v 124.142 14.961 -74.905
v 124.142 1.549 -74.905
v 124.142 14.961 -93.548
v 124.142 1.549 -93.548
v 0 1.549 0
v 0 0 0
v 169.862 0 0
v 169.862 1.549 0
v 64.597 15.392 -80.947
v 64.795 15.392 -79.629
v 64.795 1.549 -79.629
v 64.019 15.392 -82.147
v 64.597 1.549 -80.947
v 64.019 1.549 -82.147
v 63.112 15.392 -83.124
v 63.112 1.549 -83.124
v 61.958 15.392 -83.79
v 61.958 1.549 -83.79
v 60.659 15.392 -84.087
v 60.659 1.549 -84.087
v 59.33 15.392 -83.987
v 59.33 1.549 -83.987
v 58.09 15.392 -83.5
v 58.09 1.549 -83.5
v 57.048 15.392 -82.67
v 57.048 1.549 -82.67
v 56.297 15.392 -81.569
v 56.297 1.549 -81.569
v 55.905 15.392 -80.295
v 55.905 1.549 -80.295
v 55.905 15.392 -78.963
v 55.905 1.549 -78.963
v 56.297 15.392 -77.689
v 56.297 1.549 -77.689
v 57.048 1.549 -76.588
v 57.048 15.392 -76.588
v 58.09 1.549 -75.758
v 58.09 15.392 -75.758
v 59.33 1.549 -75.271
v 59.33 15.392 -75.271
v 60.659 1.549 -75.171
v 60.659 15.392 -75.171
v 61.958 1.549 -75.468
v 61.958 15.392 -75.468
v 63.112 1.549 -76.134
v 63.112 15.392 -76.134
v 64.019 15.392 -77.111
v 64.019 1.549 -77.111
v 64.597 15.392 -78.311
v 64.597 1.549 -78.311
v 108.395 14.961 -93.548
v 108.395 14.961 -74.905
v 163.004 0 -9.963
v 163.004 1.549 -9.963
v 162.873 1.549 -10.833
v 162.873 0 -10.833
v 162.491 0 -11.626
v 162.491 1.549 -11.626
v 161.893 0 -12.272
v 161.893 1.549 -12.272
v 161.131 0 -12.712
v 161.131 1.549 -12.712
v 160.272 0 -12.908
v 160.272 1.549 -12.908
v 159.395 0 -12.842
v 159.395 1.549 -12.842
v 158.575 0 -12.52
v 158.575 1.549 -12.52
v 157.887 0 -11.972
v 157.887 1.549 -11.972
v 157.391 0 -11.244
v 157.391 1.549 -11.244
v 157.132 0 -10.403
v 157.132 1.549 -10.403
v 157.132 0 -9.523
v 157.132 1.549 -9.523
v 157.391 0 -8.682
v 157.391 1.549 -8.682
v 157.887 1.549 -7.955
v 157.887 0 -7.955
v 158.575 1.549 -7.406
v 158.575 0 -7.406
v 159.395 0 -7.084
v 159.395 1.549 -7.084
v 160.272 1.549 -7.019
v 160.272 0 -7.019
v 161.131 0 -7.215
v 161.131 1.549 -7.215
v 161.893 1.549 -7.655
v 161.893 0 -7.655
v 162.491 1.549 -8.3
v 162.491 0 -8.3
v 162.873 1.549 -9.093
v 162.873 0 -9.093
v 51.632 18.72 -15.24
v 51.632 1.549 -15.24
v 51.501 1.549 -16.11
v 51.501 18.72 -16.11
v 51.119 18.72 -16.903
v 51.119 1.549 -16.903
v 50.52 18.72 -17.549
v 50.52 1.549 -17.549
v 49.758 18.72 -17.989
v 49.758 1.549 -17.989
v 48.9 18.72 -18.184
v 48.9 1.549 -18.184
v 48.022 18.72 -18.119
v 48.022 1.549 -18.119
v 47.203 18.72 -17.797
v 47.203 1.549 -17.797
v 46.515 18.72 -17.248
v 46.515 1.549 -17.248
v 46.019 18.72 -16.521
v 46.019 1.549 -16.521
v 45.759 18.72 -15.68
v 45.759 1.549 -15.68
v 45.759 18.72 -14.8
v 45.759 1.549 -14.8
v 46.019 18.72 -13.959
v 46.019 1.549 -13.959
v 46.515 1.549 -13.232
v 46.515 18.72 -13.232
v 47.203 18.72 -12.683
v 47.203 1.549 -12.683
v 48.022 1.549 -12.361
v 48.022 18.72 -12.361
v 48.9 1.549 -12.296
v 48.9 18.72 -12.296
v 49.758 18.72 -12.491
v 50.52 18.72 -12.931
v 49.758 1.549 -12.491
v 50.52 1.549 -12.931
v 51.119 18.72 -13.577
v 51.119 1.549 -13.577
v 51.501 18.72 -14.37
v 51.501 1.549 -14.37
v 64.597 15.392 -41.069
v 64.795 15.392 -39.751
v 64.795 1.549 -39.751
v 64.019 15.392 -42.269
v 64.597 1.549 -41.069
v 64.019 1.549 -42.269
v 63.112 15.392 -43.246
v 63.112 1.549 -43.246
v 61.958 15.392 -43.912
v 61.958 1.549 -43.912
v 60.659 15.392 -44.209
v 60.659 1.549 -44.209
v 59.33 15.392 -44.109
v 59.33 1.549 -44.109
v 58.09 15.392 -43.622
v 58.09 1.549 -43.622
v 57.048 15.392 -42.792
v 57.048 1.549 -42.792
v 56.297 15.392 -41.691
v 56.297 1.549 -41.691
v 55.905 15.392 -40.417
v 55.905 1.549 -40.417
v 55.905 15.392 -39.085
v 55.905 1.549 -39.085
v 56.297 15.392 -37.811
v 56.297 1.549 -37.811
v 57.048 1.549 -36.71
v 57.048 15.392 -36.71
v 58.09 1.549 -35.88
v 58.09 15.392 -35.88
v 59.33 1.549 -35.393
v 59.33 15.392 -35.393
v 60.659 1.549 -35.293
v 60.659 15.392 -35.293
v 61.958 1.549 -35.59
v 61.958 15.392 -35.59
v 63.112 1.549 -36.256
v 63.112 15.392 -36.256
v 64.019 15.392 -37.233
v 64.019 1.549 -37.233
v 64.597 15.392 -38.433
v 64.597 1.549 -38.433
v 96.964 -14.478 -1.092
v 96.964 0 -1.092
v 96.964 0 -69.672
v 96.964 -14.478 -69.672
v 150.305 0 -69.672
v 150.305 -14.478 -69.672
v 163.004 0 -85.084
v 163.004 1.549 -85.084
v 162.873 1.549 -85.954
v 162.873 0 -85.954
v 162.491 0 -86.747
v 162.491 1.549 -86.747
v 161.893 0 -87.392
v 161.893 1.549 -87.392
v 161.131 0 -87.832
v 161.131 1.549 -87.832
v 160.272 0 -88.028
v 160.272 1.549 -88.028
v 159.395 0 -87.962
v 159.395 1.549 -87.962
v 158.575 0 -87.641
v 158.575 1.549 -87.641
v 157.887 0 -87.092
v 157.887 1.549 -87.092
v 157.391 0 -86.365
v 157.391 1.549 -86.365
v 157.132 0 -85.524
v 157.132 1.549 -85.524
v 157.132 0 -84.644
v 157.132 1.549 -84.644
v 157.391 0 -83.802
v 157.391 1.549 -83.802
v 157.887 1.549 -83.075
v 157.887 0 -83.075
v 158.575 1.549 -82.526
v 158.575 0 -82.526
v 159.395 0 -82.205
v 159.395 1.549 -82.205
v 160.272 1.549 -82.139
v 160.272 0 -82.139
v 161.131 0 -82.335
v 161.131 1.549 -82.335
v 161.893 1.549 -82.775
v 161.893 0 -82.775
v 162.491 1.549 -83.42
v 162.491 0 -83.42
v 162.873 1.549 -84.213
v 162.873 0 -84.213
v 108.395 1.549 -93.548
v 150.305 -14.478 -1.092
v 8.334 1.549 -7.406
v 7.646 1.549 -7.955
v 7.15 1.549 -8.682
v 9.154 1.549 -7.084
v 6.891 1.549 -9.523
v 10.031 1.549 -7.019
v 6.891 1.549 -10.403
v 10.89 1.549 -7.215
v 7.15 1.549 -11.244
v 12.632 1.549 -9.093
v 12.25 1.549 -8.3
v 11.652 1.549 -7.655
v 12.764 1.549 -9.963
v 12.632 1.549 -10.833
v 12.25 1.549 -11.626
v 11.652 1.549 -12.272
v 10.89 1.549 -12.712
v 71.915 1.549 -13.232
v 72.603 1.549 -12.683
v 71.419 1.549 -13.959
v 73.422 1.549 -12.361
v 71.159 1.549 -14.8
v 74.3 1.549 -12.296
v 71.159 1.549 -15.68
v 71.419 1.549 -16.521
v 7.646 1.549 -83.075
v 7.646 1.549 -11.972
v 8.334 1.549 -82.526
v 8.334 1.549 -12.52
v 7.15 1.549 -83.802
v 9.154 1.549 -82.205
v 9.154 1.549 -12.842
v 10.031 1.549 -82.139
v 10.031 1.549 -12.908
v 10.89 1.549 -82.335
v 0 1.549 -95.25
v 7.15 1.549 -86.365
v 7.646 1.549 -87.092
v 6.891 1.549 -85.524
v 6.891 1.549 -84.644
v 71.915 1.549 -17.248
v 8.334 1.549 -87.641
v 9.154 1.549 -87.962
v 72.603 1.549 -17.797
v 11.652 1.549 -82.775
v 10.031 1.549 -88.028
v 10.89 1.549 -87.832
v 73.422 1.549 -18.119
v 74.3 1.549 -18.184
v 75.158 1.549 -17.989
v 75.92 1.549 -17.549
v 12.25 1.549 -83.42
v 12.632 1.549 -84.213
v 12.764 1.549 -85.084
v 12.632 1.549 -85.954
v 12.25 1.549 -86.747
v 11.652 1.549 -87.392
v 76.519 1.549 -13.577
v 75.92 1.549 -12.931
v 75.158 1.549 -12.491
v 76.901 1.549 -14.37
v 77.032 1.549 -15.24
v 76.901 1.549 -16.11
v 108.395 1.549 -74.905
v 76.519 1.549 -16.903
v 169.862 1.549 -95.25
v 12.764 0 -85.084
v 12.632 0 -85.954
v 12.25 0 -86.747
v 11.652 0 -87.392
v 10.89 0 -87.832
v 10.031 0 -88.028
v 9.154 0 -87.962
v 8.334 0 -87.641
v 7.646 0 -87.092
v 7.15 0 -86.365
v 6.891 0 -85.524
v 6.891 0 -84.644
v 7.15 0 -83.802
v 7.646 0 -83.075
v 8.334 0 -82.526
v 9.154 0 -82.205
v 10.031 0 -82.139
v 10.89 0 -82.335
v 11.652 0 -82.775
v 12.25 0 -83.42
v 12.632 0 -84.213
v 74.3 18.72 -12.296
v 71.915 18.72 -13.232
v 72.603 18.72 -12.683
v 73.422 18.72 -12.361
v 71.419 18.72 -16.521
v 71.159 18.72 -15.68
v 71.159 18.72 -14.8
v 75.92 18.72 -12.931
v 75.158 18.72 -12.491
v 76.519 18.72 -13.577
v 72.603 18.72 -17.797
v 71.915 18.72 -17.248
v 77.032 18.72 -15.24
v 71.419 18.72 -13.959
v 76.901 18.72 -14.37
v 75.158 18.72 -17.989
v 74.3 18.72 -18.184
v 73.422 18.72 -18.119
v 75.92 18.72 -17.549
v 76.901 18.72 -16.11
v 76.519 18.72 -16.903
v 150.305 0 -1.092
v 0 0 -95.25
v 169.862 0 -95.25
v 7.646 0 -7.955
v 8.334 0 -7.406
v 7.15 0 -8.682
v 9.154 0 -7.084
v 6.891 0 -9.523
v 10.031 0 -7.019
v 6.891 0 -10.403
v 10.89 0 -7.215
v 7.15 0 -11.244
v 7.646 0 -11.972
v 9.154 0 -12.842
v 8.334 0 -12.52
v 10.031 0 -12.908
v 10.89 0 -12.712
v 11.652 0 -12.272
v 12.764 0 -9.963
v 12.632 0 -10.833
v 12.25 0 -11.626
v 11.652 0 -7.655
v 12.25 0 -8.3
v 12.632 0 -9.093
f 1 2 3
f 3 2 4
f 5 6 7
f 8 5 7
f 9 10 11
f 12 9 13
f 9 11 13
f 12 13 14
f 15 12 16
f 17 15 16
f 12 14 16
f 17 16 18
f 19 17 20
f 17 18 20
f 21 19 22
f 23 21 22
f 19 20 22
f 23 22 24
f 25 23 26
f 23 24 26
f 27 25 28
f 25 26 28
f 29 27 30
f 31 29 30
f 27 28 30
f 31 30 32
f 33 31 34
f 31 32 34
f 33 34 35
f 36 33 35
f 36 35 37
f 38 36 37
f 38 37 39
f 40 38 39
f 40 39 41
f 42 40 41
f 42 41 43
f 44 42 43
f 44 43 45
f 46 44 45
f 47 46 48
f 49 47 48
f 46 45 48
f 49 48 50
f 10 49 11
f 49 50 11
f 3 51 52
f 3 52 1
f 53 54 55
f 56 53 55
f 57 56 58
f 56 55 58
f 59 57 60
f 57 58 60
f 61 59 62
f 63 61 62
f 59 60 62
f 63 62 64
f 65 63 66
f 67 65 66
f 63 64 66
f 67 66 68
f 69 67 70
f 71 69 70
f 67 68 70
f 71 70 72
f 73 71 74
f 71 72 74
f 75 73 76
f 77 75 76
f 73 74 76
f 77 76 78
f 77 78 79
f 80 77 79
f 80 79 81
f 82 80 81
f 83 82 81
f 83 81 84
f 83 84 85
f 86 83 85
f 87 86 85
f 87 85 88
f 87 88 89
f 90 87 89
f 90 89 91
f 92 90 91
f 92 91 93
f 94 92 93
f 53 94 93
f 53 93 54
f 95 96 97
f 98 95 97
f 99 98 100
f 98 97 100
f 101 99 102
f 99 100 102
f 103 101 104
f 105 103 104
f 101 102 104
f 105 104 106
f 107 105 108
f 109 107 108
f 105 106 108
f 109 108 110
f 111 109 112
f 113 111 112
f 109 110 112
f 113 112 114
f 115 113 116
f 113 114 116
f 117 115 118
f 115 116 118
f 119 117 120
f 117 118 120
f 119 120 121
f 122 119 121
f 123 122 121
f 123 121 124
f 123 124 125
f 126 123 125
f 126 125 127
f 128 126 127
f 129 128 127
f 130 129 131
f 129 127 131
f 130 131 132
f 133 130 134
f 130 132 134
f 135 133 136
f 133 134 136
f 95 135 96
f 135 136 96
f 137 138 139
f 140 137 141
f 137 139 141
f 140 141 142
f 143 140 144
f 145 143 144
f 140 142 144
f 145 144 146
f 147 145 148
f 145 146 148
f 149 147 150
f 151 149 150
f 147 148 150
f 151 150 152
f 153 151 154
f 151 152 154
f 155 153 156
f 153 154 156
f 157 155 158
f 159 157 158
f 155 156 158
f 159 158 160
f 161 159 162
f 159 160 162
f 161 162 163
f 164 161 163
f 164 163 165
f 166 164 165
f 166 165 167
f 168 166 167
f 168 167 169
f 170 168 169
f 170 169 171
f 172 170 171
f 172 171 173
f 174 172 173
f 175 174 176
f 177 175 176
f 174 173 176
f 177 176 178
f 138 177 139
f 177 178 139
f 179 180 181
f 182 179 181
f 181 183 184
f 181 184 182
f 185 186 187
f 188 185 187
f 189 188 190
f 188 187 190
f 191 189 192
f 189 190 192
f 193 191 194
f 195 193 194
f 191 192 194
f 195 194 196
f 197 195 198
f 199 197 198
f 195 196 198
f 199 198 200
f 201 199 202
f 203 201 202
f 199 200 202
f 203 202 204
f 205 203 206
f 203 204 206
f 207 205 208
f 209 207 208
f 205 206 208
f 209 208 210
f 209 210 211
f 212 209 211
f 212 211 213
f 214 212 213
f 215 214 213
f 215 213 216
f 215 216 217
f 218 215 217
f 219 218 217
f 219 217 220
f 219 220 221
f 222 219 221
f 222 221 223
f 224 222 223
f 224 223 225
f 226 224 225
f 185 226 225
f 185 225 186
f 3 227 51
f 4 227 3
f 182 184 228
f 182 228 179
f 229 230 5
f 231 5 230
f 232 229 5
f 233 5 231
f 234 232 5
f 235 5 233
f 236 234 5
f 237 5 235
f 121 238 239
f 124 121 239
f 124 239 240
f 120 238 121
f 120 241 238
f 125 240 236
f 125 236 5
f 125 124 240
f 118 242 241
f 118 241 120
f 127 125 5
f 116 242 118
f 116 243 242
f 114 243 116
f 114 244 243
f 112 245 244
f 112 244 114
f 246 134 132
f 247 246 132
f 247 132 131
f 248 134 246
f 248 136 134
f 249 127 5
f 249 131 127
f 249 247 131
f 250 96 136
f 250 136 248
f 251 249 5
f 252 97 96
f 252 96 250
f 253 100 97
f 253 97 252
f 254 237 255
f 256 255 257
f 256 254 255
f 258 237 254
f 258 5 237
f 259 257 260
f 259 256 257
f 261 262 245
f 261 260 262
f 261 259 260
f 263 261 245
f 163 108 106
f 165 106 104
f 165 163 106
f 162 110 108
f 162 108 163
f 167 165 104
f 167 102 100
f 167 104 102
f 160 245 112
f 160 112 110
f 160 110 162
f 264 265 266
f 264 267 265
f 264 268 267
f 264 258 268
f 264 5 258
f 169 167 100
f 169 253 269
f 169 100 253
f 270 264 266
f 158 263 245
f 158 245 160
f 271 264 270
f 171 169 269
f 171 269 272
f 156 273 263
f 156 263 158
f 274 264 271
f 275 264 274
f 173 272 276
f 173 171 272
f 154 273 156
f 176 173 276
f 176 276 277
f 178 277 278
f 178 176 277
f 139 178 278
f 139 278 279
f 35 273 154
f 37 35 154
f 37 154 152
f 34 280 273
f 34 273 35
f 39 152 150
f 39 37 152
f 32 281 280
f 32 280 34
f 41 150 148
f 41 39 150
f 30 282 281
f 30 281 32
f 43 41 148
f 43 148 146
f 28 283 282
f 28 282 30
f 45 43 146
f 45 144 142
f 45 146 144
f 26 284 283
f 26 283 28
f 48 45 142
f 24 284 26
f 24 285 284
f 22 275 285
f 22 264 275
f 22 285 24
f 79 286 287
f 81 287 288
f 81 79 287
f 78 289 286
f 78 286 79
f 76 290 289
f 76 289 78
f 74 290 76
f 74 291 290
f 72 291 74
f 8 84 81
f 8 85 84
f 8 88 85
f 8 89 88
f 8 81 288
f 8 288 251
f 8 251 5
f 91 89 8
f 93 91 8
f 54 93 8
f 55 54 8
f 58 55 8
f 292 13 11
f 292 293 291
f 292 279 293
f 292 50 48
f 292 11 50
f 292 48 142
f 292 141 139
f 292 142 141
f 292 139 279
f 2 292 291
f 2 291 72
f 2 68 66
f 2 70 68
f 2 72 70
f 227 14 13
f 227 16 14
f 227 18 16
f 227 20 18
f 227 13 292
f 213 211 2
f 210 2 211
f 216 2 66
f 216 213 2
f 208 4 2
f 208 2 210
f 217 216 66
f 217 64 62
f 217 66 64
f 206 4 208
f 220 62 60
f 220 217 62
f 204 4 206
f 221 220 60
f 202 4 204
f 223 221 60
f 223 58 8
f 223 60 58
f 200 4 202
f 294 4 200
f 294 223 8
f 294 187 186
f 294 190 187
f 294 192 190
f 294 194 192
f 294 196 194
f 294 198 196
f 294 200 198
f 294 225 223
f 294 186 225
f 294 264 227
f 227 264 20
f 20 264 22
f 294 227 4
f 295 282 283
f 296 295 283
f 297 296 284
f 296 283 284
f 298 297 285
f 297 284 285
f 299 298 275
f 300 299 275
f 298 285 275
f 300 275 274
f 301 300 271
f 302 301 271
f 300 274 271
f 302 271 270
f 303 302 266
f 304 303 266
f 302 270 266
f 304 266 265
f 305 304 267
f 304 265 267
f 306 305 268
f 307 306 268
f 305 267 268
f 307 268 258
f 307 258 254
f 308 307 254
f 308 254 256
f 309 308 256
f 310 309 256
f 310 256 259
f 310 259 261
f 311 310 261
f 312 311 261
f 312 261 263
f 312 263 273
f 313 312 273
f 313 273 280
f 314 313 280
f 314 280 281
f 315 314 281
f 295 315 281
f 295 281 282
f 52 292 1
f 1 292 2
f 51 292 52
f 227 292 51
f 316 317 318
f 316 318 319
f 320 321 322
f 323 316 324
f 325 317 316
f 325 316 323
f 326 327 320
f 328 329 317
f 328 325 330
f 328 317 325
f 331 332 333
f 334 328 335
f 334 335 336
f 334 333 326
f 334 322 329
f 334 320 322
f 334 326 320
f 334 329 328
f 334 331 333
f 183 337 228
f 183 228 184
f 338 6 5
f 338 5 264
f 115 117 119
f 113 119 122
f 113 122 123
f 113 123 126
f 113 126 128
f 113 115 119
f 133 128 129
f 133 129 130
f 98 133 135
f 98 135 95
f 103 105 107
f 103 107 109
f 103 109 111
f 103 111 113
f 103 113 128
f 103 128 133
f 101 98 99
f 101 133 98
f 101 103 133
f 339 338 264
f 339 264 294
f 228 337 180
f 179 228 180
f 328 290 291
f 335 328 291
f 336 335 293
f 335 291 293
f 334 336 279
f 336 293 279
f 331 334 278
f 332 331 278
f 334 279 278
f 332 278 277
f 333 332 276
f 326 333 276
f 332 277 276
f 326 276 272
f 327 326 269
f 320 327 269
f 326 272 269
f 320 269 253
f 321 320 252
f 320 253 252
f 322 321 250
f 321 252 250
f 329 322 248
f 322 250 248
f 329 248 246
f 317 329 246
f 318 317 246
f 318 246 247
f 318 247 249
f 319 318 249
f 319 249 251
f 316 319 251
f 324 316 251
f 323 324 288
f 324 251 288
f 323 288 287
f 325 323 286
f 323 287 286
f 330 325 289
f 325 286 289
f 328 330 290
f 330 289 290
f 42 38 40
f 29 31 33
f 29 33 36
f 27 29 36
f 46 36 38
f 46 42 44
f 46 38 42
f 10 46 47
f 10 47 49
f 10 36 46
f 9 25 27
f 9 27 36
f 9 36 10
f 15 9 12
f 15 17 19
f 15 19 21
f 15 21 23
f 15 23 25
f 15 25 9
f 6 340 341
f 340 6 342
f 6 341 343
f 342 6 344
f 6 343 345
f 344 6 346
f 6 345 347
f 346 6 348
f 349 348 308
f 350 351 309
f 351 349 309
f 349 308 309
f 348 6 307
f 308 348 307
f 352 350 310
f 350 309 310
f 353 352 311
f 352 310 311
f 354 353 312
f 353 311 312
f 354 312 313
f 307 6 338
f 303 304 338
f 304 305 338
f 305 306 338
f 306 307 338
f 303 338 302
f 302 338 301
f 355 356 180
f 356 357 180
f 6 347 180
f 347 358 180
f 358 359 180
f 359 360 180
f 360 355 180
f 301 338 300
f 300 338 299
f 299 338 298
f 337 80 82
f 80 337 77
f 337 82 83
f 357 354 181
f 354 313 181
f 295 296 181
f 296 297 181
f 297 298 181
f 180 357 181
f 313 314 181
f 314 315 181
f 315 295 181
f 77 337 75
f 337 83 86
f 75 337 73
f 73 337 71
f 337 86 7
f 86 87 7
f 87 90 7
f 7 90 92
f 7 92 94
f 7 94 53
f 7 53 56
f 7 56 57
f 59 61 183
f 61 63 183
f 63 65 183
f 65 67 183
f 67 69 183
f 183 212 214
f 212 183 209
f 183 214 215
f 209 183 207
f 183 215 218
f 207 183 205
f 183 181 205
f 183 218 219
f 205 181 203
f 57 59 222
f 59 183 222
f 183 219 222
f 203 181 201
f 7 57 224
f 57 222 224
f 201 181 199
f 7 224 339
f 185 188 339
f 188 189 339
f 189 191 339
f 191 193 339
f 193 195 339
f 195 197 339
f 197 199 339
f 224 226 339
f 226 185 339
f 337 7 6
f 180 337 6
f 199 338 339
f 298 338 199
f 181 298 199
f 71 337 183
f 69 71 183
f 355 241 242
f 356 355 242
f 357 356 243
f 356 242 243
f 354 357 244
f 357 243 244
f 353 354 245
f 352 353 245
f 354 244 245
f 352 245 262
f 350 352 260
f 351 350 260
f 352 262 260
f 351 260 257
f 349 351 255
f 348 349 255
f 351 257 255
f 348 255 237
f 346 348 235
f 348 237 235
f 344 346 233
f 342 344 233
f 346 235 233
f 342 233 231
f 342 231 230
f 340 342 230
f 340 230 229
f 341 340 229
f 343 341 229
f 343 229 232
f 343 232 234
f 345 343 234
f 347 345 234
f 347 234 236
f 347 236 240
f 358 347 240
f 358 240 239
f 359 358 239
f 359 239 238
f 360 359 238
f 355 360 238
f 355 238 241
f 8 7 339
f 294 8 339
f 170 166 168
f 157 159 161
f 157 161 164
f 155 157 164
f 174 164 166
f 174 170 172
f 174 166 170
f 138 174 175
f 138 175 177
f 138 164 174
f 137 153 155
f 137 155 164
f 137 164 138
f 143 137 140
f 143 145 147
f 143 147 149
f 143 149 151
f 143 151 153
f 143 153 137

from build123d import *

# Parameters (mm, degrees)
SKETCH1_W           = 169.8625
SKETCH1_H           = 95.25
BOSS_EXTRUDE1_DEPTH = 1.5494
SKETCH2_W           = 15.748
SKETCH2_H           = 18.6436
BOSS_EXTRUDE2_DEPTH = 13.4112
SKETCH3_R           = 4.4704
BOSS_EXTRUDE3_DEPTH = 13.843
SKETCH4_R           = 2.95275
BOSS_EXTRUDE4_DEPTH = 17.1704
SKETCH5_W           = 53.34
SKETCH5_H           = 68.58
BOSS_EXTRUDE5_DEPTH = 14.478
SKETCH6_R           = 2.95275
CUT_EXTRUDE1_DEPTH  = 14.478


with BuildPart() as part:
    # Sketch1 → Boss-Extrude1 (new body)
    with BuildSketch(Plane(origin=(0, 0, 0), x_dir=(1, 0, 0), z_dir=(0, 1, 0))):
        with Locations((84.93125, 47.625)):
            Rectangle(SKETCH1_W, SKETCH1_H)
    extrude(amount=BOSS_EXTRUDE1_DEPTH)

    # Sketch2 → Boss-Extrude2 (add)
    with BuildSketch(Plane(origin=(0, 1.5494, 0), x_dir=(1, 0, 0), z_dir=(0, 1, 0))):
        with Locations((116.2685, 84.2264)):
            Rectangle(SKETCH2_W, SKETCH2_H)
    extrude(amount=BOSS_EXTRUDE2_DEPTH)

    # Sketch3 → Boss-Extrude3 (add)
    with BuildSketch(Plane(origin=(0, 1.5494, 0), x_dir=(1, 0, 0), z_dir=(0, 1, 0))):
        with Locations((60.325, 79.629)):
            Circle(SKETCH3_R)
        with Locations((60.325, 39.751)):
            Circle(SKETCH3_R)
    extrude(amount=BOSS_EXTRUDE3_DEPTH)

    # Sketch4 → Boss-Extrude4 (add)
    with BuildSketch(Plane(origin=(0, 1.5494, 0), x_dir=(1, 0, 0), z_dir=(0, 1, 0))):
        with Locations((48.6791, 15.24)):
            Circle(SKETCH4_R)
        with Locations((74.0791, 15.24)):
            Circle(SKETCH4_R)
    extrude(amount=BOSS_EXTRUDE4_DEPTH)

    # Sketch5 → Boss-Extrude5 (add)
    with BuildSketch(Plane(origin=(0, 0, 0), x_dir=(-1, 0, 0), z_dir=(0, -1, 0))):
        with Locations((-123.6345, 35.3822)):
            Rectangle(SKETCH5_W, SKETCH5_H)
    extrude(amount=BOSS_EXTRUDE5_DEPTH)

    # Sketch6 → Cut-Extrude1 (cut)
    with BuildSketch(Plane(origin=(0, 1.5494, 0), x_dir=(1, 0, 0), z_dir=(0, 1, 0))):
        with Locations((9.81075, 85.08365)):
            Circle(SKETCH6_R)
        with Locations((160.05175, 85.08365)):
            Circle(SKETCH6_R)
        with Locations((160.05175, 9.96315)):
            Circle(SKETCH6_R)
        with Locations((9.81075, 9.96315)):
            Circle(SKETCH6_R)
    extrude(amount=-CUT_EXTRUDE1_DEPTH, mode=Mode.SUBTRACT)


solid = part.part
